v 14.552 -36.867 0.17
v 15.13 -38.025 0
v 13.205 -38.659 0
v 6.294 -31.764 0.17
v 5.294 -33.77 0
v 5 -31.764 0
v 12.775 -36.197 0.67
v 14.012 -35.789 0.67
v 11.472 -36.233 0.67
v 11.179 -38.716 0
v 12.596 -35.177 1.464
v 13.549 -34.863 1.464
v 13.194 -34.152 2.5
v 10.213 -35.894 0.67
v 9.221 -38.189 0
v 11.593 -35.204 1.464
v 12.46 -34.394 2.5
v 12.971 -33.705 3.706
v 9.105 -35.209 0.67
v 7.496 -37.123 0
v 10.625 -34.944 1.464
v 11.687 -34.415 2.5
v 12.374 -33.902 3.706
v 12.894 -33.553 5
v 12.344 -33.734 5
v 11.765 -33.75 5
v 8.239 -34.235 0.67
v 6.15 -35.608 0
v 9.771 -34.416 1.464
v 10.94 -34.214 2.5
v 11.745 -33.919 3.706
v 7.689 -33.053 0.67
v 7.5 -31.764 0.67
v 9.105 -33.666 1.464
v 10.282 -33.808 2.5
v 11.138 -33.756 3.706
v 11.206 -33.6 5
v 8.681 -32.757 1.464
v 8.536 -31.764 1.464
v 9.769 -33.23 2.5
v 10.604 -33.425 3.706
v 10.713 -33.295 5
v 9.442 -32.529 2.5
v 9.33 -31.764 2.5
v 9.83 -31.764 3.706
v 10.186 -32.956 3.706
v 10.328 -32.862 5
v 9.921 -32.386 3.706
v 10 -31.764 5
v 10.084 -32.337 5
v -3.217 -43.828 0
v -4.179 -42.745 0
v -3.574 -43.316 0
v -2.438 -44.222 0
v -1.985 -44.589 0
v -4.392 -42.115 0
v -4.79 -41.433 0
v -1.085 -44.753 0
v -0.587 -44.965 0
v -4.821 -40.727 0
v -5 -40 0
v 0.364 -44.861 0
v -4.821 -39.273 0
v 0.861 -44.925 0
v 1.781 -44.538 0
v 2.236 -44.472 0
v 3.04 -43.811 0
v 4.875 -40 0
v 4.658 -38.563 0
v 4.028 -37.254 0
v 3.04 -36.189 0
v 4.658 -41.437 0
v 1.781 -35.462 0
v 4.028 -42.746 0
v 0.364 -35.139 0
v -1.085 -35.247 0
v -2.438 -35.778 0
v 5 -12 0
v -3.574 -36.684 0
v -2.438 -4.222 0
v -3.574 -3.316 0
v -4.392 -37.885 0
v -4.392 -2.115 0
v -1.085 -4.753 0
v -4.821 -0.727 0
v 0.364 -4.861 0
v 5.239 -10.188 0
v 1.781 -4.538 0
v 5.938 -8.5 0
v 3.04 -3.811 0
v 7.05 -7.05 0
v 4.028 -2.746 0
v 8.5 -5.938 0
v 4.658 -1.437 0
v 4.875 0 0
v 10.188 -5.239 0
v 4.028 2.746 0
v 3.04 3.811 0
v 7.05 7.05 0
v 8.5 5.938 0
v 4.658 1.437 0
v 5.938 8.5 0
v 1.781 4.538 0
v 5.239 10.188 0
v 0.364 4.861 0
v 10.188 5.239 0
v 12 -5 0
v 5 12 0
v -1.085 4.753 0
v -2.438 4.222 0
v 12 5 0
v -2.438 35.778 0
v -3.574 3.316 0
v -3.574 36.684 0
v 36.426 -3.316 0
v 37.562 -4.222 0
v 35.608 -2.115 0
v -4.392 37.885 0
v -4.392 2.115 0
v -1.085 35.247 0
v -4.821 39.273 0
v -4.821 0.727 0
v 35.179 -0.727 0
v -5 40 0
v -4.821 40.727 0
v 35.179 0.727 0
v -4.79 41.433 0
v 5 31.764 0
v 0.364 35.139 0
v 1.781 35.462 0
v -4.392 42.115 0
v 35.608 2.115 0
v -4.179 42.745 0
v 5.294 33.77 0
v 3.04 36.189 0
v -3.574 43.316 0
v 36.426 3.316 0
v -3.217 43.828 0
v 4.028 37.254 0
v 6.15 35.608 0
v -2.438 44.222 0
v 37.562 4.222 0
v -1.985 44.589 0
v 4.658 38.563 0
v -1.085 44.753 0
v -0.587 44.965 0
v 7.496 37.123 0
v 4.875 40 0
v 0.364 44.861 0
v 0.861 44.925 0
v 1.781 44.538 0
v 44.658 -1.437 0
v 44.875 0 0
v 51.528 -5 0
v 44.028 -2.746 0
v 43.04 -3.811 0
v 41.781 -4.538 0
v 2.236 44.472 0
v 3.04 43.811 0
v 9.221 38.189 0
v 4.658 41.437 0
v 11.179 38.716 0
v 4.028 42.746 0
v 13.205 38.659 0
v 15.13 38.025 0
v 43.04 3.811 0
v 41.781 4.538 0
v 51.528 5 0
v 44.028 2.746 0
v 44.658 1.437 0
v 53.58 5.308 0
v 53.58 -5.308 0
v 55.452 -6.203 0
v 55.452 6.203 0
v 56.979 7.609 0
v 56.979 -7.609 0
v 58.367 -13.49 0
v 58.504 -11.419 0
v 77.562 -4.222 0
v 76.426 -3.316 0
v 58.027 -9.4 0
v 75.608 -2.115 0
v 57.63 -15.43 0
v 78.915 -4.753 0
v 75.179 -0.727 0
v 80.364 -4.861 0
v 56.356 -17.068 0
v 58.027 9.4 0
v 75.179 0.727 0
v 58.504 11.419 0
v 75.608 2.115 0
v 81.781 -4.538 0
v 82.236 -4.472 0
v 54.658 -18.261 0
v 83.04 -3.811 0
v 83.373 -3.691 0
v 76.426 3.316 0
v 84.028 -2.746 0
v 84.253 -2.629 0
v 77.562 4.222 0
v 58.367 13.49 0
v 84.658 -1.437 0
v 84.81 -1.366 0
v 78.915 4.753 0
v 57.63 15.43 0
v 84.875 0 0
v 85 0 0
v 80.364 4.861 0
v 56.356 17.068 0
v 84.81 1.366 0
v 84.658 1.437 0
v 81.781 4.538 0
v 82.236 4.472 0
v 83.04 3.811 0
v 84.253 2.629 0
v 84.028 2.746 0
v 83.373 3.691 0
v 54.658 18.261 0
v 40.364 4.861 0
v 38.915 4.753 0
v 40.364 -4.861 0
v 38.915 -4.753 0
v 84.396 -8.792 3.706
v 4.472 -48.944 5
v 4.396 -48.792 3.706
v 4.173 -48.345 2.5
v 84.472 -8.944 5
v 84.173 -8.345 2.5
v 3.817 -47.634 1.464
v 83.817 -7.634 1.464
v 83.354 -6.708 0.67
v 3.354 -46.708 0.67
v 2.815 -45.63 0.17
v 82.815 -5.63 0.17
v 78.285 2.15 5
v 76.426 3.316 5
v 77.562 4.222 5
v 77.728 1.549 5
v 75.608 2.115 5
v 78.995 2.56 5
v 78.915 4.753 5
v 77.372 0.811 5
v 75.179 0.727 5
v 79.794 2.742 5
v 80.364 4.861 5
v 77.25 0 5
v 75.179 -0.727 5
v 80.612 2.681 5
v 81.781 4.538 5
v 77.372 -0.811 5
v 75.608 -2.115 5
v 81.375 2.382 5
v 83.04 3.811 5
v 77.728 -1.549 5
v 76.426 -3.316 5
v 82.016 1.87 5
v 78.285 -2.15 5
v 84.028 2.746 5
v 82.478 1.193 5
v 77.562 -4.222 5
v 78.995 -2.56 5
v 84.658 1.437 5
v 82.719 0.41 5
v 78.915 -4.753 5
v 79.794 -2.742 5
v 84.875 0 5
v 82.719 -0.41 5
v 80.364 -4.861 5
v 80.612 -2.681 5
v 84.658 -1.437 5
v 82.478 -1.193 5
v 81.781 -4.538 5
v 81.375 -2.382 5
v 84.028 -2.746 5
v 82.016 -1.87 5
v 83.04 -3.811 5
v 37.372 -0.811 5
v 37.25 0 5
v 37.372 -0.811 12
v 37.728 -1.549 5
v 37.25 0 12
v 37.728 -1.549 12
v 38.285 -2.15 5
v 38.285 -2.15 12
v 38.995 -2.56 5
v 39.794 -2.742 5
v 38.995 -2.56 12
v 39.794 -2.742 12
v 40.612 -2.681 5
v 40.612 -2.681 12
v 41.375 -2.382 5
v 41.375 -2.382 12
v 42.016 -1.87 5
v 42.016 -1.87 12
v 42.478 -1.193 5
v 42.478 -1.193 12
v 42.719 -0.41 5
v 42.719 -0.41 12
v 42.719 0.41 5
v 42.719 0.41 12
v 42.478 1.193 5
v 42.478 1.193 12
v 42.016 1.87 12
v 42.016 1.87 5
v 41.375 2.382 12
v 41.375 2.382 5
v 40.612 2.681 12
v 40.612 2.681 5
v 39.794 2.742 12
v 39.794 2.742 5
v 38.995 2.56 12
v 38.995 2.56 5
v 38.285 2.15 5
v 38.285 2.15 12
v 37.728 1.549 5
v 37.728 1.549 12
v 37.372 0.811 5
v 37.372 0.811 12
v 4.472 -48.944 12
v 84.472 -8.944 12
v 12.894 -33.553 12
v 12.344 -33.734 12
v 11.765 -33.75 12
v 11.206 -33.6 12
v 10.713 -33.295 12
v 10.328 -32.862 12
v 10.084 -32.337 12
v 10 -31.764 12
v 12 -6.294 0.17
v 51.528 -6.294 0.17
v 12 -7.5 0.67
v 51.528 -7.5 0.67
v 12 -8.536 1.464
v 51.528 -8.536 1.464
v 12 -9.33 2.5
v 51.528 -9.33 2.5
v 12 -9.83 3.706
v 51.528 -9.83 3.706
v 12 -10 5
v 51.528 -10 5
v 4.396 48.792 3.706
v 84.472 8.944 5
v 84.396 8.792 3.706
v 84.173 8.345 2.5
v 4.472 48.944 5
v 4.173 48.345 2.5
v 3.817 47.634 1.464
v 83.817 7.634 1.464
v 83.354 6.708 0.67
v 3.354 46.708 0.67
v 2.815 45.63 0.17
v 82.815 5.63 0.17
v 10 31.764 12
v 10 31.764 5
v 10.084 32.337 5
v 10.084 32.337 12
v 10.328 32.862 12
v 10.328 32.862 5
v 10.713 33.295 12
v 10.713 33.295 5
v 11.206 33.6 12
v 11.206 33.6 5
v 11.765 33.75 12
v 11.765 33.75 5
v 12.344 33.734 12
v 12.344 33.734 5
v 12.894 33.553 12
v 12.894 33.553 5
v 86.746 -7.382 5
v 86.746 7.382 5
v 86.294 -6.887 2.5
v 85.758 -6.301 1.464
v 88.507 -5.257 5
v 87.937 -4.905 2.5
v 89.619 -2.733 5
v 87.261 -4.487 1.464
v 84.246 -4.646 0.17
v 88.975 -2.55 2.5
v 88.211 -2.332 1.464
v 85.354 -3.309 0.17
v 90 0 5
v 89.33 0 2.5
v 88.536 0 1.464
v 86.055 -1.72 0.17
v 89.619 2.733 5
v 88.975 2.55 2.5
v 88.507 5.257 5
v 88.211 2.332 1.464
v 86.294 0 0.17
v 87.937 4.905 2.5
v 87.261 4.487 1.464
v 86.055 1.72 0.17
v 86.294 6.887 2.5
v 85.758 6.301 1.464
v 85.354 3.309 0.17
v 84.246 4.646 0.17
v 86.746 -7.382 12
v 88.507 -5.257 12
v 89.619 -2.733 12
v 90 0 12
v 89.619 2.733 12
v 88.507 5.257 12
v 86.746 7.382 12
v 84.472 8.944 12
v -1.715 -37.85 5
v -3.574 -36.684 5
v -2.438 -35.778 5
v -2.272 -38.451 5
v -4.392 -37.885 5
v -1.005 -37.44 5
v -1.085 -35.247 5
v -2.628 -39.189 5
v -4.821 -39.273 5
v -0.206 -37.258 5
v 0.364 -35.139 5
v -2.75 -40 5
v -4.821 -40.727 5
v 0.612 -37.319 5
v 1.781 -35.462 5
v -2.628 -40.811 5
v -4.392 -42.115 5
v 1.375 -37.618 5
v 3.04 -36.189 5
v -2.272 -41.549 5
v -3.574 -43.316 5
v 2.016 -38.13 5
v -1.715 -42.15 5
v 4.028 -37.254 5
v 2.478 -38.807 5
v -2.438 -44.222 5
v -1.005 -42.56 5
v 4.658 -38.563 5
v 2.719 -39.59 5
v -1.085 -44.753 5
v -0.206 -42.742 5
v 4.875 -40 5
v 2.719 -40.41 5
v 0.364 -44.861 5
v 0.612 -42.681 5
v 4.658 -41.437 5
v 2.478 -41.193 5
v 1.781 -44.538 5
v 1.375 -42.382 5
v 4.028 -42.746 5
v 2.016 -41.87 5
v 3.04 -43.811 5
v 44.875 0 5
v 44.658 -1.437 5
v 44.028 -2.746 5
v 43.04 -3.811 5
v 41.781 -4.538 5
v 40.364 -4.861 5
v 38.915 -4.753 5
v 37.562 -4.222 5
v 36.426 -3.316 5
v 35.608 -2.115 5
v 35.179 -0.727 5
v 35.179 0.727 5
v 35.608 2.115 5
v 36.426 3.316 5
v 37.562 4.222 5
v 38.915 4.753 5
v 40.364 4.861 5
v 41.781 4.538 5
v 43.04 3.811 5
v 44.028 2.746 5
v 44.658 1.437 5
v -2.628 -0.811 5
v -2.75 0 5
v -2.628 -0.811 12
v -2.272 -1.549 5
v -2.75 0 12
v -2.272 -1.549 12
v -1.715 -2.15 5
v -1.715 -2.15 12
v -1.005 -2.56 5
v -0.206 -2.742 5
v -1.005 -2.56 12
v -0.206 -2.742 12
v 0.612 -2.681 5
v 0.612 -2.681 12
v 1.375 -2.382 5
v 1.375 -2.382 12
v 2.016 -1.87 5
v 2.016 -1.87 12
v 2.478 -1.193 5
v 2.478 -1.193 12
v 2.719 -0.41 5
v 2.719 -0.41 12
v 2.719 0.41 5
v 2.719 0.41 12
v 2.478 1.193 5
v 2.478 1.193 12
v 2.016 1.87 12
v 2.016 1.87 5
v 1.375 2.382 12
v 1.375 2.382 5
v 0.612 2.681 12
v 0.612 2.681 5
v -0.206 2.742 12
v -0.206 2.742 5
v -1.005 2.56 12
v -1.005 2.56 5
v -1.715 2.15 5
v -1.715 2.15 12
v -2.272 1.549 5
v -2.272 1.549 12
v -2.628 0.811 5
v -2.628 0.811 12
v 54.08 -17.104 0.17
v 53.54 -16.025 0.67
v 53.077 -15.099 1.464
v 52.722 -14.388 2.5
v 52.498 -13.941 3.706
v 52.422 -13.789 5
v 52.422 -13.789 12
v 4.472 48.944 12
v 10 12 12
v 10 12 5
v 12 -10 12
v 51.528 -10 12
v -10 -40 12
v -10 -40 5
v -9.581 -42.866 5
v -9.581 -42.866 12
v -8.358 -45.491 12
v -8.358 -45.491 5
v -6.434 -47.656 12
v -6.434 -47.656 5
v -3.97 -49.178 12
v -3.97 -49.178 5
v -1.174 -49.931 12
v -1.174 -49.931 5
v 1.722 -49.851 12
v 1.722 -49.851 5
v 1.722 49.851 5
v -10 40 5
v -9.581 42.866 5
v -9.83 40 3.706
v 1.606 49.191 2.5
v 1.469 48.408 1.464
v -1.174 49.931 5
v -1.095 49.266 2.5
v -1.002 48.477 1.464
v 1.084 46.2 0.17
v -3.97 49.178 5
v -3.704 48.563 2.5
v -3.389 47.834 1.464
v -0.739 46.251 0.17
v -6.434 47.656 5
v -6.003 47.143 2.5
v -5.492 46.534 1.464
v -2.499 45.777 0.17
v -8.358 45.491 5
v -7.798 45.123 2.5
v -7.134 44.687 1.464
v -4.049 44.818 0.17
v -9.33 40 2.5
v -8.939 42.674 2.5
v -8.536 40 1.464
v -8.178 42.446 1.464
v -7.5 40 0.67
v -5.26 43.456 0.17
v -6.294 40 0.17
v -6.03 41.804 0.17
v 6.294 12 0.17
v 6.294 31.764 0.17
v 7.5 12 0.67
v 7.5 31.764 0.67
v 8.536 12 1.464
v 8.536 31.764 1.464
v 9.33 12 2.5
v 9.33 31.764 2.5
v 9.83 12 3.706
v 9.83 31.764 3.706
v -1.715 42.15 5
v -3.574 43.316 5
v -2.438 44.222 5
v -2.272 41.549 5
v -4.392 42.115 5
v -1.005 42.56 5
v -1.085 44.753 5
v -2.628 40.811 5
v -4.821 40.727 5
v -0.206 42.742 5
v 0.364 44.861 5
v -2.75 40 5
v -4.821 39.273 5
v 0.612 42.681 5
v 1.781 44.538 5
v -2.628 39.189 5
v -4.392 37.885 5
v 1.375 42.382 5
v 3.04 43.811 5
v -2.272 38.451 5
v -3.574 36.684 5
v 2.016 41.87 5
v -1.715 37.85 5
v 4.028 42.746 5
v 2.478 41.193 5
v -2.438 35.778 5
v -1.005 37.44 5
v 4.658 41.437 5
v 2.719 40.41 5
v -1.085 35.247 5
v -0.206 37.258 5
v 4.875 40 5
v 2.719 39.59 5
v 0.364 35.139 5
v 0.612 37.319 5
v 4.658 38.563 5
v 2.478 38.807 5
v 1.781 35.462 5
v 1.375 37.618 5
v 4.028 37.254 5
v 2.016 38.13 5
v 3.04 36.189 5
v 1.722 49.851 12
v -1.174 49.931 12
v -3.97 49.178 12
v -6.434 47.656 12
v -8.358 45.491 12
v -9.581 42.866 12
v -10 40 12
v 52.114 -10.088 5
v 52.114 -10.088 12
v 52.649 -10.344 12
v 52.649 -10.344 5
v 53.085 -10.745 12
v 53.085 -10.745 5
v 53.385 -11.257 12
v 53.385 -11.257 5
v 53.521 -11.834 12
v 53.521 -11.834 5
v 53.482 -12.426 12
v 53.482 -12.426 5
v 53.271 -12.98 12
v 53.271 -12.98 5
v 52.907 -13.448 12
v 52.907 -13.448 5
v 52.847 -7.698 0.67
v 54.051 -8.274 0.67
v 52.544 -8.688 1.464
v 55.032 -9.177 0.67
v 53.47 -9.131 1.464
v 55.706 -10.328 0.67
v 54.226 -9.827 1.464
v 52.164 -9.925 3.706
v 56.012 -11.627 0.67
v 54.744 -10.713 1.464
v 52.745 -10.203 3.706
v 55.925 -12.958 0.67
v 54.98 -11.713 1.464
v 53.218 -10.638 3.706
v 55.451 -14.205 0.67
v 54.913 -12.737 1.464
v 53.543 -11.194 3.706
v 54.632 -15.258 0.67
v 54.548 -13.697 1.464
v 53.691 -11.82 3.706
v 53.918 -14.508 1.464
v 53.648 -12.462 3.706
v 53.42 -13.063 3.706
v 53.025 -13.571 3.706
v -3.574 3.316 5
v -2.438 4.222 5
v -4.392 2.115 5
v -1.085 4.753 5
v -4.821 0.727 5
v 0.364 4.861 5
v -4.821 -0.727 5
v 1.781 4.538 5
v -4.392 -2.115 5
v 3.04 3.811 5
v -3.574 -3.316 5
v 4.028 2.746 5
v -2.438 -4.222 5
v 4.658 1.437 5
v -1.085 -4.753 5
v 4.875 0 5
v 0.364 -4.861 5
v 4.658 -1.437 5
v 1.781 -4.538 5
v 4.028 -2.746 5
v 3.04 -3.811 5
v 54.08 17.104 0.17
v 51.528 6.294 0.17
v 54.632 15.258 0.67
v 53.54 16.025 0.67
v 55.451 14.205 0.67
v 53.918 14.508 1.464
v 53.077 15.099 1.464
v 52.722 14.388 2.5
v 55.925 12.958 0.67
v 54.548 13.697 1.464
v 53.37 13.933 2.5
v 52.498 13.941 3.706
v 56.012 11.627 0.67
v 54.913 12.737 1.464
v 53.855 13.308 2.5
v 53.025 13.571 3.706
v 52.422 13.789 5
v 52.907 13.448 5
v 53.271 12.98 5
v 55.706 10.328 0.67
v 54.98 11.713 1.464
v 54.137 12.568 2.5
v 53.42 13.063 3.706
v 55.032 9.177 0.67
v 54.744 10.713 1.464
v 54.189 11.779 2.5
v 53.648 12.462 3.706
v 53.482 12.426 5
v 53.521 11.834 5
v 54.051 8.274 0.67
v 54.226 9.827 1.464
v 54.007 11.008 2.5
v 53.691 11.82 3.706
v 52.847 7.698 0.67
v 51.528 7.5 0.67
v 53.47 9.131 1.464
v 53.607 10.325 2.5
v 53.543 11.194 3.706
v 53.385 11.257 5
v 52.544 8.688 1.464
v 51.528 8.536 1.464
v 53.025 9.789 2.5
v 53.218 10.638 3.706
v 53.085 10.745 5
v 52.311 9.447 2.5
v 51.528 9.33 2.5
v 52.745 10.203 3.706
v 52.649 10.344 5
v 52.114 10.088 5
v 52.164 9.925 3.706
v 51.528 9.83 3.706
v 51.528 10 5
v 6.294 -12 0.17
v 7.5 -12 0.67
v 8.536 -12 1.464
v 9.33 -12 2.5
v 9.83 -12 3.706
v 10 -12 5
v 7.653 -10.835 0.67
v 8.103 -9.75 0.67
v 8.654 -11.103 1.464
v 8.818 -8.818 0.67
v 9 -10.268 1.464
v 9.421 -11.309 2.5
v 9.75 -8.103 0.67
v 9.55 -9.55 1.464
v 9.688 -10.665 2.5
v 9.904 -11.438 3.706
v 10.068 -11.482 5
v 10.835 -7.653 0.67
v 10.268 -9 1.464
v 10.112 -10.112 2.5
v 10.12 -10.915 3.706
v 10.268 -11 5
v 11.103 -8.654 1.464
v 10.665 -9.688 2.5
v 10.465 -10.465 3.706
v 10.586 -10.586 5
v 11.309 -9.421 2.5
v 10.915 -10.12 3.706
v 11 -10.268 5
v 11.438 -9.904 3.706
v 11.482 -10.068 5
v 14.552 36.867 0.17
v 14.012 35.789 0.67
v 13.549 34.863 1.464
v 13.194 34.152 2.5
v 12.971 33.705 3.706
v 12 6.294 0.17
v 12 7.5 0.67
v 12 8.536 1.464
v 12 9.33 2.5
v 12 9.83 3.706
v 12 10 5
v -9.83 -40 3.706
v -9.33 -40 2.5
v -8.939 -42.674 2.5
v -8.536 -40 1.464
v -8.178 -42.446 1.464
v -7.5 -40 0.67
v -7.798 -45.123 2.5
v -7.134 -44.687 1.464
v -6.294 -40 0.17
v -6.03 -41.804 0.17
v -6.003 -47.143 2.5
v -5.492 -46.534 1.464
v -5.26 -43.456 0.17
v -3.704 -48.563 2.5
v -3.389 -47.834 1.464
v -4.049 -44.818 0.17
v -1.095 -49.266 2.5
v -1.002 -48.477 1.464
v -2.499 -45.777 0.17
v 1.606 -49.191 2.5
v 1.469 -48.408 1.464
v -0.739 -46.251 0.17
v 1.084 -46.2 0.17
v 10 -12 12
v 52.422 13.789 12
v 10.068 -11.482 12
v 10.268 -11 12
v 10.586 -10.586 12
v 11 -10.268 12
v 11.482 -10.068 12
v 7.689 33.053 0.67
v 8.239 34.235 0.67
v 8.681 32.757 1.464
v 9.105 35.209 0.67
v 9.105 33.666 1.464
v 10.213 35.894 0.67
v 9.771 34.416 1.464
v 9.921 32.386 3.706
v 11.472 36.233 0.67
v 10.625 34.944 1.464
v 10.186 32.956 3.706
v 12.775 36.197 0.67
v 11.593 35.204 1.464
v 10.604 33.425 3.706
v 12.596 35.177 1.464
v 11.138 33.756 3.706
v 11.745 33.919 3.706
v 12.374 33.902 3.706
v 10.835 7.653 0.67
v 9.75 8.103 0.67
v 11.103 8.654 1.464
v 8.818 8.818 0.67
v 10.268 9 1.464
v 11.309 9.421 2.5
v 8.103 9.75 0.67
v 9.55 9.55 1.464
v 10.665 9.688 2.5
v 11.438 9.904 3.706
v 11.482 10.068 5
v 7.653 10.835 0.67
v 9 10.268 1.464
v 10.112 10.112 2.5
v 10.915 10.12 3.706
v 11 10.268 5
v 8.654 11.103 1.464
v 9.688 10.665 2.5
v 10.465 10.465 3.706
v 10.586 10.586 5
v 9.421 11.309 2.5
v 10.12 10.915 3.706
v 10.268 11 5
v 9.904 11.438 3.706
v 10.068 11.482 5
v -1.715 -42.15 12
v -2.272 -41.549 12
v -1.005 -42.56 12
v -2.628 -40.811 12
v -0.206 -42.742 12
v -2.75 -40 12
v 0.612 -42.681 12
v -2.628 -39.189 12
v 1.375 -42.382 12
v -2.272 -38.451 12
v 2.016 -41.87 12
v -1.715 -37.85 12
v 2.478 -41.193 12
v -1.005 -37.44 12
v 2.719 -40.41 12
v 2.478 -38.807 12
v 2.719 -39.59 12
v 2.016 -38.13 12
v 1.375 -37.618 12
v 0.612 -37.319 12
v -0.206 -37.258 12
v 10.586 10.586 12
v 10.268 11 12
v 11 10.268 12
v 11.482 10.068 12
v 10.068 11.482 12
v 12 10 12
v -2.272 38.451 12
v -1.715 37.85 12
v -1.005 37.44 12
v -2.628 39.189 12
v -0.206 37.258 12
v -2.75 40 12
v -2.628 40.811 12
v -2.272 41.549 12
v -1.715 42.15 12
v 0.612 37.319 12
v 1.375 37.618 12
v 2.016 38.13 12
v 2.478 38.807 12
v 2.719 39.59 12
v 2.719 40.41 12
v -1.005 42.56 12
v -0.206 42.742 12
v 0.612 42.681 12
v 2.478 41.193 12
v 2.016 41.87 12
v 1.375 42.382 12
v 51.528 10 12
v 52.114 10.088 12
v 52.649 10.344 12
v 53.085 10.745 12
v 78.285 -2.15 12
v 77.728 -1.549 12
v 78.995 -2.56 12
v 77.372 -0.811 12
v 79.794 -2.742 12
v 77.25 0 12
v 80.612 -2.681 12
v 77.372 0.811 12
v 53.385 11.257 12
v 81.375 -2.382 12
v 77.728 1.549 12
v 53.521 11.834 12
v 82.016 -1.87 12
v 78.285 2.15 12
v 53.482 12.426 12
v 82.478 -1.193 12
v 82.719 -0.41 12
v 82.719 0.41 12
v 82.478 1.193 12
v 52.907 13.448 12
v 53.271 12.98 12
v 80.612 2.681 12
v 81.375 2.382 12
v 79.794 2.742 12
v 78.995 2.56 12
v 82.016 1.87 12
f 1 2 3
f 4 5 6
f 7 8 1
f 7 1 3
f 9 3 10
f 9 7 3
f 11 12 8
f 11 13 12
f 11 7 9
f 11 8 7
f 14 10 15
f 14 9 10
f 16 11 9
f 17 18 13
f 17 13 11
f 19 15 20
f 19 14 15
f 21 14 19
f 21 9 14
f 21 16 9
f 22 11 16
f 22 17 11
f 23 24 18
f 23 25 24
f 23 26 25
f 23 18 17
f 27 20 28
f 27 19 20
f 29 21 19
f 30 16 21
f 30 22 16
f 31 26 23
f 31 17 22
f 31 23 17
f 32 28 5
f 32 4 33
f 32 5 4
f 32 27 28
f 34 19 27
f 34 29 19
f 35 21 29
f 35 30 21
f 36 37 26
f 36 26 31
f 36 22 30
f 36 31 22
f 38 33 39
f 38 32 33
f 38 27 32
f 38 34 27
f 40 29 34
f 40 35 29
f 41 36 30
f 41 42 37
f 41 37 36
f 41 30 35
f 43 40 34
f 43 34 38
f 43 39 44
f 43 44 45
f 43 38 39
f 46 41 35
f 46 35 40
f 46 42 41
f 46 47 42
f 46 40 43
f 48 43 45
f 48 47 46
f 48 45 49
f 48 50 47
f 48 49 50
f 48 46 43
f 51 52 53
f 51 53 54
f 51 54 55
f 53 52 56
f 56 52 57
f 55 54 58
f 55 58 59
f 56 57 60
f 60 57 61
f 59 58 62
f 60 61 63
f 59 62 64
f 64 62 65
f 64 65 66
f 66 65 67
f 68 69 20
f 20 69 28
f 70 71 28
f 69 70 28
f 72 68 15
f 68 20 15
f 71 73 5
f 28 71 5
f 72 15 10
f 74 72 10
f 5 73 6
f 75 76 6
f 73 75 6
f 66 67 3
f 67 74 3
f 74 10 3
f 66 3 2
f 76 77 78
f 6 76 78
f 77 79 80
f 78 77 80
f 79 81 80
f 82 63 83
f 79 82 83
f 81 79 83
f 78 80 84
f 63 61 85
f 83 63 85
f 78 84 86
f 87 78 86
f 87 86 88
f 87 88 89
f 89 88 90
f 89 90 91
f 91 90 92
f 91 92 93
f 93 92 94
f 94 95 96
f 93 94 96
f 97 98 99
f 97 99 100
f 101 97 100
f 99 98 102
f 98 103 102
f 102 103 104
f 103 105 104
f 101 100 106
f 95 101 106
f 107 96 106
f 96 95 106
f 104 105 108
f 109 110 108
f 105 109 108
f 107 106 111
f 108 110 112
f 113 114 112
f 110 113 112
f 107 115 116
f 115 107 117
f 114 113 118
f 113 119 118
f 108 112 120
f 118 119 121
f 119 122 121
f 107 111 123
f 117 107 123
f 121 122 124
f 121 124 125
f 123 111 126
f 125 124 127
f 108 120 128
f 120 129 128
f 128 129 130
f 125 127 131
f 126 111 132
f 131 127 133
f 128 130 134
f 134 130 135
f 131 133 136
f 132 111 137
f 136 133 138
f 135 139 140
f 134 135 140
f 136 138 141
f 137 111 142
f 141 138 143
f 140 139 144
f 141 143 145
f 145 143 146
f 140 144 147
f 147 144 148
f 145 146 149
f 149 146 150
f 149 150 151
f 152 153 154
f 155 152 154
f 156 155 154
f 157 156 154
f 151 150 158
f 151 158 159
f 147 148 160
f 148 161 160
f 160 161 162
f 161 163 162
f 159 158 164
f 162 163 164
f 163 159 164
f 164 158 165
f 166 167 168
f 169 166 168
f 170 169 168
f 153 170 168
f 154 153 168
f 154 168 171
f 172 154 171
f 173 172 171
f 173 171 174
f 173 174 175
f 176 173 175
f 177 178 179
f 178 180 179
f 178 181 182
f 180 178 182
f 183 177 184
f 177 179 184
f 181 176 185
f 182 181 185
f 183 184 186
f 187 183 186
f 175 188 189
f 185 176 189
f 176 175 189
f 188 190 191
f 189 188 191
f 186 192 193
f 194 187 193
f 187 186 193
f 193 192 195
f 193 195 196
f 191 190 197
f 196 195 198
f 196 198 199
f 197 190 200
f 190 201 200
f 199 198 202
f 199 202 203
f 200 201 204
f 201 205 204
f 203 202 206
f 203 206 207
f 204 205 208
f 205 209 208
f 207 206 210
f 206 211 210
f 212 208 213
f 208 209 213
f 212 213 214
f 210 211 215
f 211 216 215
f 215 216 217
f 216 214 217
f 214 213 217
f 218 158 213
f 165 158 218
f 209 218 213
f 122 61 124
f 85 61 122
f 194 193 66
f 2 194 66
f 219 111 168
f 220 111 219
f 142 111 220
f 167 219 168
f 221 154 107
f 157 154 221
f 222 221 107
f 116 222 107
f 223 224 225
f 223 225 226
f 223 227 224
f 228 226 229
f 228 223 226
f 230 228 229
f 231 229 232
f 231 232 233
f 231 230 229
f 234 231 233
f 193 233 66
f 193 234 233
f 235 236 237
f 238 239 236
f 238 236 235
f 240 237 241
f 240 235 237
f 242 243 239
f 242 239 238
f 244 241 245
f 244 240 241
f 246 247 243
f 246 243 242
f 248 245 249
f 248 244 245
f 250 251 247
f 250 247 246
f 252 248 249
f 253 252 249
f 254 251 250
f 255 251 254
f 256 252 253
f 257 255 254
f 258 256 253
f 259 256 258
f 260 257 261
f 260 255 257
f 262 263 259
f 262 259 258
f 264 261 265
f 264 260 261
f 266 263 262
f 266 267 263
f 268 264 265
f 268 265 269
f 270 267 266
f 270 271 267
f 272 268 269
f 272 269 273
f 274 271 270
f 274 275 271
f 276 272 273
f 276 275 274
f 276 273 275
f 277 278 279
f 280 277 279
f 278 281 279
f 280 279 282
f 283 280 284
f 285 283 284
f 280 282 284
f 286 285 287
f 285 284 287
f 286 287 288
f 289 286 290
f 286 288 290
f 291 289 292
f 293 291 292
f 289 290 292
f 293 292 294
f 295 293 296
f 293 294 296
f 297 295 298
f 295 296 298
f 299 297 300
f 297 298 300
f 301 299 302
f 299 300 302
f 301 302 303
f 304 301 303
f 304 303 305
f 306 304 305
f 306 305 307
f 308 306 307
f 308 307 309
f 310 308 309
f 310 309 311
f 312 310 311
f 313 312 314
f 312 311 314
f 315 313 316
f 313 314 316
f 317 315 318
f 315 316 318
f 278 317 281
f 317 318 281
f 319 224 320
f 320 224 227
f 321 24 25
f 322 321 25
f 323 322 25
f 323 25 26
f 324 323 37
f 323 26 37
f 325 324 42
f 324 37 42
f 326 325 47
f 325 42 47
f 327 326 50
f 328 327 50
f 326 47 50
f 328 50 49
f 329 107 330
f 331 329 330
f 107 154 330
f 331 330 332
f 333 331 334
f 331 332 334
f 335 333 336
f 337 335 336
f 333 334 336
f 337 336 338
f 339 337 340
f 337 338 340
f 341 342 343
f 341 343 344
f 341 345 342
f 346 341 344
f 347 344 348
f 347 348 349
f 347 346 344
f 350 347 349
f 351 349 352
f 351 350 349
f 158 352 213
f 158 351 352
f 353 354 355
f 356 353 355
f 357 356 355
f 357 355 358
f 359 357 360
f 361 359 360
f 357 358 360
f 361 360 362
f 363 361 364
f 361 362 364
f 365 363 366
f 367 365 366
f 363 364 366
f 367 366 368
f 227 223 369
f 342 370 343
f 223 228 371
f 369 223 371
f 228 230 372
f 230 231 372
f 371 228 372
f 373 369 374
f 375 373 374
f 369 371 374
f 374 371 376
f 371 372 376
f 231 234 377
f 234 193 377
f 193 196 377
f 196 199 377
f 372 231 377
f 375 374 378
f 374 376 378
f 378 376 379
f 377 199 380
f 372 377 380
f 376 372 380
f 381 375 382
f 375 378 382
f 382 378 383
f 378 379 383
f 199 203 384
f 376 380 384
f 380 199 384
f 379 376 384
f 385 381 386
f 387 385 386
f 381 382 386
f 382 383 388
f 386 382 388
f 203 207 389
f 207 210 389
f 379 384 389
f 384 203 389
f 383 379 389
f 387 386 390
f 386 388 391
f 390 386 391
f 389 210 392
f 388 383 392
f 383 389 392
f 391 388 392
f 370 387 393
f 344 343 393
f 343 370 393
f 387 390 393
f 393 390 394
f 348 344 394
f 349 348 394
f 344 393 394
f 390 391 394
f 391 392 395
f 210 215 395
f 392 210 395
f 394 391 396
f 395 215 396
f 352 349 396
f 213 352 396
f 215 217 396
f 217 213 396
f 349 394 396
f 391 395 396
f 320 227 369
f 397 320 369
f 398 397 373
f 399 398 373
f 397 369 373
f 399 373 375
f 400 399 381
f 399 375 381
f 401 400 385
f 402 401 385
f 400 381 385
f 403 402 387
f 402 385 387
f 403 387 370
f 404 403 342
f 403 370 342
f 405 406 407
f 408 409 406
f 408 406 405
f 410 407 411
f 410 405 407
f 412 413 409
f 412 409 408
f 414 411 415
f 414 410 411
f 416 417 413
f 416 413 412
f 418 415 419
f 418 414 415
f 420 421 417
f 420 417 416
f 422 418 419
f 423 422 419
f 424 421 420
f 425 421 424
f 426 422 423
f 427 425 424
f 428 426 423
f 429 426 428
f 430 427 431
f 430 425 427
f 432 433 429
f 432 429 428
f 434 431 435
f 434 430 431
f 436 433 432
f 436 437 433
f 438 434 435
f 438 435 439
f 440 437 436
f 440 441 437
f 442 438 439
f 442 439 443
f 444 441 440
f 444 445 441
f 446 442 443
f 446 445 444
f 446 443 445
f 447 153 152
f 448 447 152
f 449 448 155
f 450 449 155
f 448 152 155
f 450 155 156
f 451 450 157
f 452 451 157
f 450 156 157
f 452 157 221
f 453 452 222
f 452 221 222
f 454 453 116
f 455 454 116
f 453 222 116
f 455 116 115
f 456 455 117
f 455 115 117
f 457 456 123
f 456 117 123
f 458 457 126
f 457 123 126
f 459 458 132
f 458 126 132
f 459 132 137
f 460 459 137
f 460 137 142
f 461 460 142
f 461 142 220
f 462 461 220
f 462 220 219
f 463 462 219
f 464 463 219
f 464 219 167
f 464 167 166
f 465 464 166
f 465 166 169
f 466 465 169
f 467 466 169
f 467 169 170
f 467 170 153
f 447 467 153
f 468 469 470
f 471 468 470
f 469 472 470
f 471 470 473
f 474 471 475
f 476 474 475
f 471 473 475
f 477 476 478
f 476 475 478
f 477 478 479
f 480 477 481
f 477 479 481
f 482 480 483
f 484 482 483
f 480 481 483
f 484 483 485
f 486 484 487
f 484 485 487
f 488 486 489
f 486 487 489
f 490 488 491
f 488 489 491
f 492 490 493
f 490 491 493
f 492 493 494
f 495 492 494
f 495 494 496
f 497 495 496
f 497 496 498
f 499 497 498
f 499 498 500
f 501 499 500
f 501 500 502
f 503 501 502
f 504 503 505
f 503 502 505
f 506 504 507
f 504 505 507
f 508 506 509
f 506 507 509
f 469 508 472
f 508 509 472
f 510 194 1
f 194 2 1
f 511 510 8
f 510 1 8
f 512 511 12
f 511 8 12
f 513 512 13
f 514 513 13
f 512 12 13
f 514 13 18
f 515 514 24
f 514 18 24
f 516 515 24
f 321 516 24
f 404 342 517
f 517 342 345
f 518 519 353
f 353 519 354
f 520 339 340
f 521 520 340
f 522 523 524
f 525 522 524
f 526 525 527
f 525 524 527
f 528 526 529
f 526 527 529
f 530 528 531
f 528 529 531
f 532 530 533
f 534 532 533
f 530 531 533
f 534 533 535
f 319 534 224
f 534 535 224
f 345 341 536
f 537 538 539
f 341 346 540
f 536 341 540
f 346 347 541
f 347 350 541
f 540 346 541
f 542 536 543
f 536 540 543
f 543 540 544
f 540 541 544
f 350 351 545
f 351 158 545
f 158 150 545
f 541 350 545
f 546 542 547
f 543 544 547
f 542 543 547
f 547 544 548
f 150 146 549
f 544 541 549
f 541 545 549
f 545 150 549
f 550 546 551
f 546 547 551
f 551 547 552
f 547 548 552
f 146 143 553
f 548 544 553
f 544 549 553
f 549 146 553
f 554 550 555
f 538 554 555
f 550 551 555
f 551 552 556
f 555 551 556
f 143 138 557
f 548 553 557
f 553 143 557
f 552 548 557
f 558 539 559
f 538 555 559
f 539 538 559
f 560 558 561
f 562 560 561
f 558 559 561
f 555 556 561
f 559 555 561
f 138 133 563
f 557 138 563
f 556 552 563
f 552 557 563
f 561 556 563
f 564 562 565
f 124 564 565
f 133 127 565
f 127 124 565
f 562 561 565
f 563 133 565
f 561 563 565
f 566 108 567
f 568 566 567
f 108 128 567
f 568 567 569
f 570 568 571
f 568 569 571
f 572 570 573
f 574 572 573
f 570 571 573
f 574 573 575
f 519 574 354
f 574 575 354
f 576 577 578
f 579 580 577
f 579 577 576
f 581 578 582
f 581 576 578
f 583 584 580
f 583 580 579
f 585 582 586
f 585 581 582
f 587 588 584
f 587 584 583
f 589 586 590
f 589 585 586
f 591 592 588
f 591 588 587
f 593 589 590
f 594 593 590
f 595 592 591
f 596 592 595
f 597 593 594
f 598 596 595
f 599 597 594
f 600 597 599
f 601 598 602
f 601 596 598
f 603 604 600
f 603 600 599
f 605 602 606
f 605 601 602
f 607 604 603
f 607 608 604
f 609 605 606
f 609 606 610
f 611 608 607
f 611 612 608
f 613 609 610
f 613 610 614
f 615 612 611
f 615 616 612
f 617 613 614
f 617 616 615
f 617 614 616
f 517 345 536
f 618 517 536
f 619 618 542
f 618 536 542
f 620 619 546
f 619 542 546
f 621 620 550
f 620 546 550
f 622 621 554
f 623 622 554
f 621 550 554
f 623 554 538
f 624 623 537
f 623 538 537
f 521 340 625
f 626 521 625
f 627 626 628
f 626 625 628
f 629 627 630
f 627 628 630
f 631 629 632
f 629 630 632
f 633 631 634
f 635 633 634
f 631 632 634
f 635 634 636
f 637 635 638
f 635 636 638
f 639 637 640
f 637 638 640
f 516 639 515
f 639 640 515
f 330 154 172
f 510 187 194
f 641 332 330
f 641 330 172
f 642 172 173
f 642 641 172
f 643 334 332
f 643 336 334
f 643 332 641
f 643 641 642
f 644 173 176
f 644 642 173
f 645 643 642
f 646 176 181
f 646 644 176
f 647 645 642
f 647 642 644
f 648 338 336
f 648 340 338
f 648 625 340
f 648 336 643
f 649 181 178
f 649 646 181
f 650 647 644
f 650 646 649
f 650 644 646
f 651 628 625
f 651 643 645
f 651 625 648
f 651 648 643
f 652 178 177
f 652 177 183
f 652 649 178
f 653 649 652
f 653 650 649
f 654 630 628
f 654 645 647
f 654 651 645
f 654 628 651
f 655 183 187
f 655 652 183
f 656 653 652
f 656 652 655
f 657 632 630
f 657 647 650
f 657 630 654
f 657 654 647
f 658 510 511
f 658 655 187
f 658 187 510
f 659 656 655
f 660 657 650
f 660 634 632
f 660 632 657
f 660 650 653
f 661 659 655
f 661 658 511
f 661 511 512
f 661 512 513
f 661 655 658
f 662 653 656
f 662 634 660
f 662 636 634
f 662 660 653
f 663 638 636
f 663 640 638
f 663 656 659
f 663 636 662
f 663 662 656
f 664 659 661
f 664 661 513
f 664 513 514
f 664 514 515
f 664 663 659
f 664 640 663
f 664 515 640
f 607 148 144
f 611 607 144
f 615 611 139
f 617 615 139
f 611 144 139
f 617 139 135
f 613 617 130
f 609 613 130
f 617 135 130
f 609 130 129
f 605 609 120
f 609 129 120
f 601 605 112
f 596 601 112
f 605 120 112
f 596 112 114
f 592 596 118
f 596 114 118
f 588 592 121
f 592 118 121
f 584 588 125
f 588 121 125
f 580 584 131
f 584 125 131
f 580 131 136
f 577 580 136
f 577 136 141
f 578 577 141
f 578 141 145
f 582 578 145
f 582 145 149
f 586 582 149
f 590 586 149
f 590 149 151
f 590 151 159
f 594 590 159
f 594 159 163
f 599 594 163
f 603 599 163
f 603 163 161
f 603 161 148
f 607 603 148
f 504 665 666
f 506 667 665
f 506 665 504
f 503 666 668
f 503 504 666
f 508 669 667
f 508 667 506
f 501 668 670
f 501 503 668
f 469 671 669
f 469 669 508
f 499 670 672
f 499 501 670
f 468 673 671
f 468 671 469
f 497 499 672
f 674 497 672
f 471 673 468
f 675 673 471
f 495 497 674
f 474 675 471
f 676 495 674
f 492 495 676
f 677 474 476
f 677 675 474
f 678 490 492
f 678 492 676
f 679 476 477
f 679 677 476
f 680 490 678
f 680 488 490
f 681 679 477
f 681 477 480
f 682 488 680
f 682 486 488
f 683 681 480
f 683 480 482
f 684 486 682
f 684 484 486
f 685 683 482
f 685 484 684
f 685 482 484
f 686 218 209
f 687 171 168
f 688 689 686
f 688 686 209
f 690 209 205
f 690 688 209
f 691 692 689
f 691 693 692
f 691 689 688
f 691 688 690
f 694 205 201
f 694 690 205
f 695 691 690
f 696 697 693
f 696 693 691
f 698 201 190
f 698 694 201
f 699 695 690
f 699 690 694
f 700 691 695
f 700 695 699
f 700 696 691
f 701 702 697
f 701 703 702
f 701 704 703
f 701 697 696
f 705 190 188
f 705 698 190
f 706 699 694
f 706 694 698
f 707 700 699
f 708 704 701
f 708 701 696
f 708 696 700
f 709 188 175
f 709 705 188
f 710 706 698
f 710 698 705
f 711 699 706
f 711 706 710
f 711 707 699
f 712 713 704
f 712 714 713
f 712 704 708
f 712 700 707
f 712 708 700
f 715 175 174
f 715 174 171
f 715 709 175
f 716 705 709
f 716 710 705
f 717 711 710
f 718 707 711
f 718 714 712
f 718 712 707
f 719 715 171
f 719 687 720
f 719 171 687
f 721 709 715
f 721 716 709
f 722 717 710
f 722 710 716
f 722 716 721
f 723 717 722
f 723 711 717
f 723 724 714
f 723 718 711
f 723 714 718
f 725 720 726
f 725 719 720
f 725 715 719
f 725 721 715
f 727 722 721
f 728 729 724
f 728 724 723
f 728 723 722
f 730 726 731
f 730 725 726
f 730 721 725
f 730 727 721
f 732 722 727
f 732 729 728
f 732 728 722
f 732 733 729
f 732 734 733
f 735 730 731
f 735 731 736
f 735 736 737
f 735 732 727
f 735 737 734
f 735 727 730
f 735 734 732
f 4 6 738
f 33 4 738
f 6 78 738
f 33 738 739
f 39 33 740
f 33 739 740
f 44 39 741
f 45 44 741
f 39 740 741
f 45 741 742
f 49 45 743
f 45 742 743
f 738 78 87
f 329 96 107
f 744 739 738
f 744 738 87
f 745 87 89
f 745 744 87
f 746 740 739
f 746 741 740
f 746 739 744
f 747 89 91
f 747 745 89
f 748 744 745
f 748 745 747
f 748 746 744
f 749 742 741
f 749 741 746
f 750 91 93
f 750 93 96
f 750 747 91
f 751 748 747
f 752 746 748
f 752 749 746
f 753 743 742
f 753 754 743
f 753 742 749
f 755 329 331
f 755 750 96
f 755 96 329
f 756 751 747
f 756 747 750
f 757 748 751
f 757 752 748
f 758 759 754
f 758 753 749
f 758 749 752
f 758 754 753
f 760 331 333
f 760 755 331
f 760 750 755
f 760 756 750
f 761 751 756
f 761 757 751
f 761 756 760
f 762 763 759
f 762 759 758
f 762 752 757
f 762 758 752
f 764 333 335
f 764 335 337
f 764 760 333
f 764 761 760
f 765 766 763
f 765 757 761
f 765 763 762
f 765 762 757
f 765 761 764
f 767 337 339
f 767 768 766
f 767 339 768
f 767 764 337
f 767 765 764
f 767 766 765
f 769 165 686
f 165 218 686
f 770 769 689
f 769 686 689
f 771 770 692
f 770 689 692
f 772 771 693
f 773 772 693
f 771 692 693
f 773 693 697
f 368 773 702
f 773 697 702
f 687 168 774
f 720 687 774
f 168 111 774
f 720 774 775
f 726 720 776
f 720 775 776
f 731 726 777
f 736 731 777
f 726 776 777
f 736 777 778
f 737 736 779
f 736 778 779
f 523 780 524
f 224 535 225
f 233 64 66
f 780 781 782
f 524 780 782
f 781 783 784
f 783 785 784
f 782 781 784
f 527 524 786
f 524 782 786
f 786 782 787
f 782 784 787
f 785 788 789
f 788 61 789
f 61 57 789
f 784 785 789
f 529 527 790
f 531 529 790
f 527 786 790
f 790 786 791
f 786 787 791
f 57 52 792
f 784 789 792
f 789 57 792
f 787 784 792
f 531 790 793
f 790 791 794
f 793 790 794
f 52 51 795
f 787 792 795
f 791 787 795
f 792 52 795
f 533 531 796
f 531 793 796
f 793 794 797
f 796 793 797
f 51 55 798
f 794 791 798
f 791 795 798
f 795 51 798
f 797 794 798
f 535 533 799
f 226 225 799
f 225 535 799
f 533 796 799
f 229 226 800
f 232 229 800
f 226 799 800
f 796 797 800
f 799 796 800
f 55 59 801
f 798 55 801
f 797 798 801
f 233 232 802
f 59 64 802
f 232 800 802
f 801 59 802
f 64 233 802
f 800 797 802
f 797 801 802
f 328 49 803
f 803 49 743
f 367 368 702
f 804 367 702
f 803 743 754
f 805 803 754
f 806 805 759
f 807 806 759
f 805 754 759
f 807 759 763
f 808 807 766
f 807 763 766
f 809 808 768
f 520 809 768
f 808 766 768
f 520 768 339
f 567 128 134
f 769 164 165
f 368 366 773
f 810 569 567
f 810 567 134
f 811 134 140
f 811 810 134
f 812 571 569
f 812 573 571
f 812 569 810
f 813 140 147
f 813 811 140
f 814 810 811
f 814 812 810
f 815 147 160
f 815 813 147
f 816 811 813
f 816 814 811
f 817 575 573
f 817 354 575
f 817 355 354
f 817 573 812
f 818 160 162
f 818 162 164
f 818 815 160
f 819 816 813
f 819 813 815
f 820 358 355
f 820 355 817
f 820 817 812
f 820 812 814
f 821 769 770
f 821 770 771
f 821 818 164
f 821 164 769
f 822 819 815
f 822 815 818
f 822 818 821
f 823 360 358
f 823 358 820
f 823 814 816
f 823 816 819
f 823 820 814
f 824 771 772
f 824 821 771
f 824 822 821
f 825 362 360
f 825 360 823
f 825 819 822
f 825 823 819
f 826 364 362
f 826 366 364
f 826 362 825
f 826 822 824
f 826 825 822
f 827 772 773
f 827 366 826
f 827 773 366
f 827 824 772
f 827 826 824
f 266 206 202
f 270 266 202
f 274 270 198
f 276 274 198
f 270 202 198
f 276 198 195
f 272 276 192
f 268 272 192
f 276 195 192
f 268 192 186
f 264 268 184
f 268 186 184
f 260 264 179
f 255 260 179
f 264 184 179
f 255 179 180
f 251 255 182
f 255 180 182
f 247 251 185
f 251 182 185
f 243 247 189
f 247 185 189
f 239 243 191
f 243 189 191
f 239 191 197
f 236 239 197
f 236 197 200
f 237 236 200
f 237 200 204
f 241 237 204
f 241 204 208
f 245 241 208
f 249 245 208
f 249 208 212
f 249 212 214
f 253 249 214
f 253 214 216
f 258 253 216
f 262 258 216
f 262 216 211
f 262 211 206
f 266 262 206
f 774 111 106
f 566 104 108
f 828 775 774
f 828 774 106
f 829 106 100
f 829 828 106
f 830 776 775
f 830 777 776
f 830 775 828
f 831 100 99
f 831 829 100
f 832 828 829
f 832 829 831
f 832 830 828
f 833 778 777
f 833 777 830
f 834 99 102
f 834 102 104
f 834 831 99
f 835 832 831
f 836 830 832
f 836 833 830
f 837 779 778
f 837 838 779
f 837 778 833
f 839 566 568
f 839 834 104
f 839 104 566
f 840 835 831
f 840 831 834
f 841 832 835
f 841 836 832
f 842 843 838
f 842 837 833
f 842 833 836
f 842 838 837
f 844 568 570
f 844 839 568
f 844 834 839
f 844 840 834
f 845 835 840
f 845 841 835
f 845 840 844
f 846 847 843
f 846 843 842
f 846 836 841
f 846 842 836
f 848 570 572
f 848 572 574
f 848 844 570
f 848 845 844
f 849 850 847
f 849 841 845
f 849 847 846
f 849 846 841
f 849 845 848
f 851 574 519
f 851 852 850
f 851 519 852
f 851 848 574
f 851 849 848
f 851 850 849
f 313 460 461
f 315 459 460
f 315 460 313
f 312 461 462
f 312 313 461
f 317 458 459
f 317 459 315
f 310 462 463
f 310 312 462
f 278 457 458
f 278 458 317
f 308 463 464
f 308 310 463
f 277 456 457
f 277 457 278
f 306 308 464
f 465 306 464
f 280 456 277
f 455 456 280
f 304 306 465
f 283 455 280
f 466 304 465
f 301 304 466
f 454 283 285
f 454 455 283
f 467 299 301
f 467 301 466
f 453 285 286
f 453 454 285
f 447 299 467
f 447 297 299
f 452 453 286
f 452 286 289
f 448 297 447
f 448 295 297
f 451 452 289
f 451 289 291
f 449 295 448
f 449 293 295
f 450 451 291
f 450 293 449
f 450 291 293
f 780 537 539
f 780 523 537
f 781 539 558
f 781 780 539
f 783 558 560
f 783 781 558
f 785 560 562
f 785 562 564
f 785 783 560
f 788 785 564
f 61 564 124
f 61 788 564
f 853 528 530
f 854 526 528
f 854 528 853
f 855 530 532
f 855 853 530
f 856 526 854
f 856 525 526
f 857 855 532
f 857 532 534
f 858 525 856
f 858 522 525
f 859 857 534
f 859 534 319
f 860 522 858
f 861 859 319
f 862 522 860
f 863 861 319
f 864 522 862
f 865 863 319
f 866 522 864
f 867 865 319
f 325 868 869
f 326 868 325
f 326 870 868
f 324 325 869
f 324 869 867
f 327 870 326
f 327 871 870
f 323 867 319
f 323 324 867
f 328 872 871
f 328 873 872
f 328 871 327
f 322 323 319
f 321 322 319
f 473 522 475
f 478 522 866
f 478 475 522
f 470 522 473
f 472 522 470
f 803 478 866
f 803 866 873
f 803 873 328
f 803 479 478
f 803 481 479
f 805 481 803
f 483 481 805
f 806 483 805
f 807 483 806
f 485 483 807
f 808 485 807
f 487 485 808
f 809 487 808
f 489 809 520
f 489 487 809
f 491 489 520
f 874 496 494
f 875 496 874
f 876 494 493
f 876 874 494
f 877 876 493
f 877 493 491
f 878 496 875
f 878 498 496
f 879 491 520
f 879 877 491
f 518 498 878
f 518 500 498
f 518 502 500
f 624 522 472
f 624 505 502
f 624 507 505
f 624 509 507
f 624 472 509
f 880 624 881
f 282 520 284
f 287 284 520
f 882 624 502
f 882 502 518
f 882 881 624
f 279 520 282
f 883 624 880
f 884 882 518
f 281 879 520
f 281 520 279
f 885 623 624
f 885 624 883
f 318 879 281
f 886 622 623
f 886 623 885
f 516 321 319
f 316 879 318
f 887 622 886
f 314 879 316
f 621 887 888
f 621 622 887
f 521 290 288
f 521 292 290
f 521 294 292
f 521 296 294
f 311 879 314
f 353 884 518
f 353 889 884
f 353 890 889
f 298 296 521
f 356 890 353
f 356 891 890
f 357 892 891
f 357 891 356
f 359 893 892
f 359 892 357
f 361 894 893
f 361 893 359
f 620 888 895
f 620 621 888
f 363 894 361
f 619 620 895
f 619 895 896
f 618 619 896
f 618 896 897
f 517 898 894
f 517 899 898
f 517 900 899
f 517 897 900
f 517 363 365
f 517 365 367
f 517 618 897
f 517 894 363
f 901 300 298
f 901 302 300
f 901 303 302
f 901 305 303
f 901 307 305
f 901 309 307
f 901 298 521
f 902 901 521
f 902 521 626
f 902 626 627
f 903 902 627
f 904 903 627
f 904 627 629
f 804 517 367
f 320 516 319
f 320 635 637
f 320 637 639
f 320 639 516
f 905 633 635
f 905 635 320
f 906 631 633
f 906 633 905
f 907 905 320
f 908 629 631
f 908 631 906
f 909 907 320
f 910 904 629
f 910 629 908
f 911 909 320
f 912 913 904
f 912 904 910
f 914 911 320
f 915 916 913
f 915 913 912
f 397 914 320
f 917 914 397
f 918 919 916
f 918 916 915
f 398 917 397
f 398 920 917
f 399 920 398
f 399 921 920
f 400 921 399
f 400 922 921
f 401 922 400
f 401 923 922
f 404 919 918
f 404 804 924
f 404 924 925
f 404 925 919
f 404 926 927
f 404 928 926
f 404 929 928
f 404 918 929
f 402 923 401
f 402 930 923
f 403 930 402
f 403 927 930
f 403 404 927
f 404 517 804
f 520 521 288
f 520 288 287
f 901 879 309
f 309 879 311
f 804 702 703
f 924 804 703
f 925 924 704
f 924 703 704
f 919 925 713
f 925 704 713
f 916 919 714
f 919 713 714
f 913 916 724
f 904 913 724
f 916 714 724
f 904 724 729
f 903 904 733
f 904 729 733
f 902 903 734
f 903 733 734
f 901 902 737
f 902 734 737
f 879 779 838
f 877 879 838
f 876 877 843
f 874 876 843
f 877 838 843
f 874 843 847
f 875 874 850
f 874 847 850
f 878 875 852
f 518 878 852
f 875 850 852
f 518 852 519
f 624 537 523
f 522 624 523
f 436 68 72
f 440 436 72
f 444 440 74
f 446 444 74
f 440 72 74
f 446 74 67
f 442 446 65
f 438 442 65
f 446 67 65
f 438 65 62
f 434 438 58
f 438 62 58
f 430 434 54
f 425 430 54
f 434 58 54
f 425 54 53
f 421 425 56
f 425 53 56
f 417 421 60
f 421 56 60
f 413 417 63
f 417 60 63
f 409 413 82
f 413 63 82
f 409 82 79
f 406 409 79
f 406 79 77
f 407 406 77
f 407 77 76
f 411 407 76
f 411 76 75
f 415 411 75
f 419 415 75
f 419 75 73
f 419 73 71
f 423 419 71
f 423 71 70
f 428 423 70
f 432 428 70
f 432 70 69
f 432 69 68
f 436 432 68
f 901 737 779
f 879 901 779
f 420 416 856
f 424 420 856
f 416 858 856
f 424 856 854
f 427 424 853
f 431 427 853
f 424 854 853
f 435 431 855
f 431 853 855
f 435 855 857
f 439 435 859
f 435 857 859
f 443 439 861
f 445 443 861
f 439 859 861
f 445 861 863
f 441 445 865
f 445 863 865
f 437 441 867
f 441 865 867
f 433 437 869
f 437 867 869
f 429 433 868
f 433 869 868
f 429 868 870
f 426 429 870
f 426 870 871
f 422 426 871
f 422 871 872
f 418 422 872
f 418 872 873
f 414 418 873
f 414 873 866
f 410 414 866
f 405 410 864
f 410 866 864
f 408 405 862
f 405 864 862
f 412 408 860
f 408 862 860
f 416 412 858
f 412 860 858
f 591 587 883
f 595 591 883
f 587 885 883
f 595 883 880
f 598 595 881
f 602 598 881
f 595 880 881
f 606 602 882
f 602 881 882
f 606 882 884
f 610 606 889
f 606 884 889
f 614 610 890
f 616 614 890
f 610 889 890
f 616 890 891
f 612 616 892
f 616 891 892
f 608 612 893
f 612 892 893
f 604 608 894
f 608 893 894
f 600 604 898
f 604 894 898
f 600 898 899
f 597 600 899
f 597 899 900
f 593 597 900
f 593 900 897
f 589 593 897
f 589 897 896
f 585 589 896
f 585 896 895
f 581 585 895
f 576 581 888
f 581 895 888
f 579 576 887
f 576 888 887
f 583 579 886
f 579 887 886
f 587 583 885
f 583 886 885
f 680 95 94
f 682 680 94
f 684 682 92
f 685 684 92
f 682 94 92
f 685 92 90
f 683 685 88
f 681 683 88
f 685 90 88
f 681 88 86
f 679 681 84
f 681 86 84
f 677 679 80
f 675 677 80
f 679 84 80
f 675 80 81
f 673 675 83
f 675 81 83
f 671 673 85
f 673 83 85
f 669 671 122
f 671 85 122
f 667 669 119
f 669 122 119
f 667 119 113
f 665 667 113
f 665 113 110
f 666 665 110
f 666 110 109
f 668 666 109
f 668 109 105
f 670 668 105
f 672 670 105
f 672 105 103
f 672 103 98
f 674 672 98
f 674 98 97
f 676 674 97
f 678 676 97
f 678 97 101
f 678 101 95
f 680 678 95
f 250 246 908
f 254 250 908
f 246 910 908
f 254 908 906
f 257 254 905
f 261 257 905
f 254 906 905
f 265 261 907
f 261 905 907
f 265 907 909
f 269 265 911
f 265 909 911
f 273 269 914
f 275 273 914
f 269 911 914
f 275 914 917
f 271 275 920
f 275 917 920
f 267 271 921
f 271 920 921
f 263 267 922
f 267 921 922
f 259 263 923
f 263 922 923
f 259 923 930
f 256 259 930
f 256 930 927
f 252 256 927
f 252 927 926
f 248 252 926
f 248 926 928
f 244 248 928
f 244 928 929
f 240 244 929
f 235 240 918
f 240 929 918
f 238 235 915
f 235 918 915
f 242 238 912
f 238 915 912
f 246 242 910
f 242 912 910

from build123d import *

# Parameters (mm, degrees)
F1_DEPTH       = 12
F2_D           = 5.5
F2_CBORE_D     = 9.75
F2_CBORE_DEPTH = 5
F3_R           = 4.99999


# Not quite as in the source:
# - a fillet or chamfer is up to 0.001 mm smaller than in the source, because OpenCascade refuses the exact size


with BuildPart() as f1:
    # F0 (on Top) → F1 (new body)
    with BuildSketch(Plane.XY):
        with BuildLine():
            Line((84.472135955, 8.94427191), (4.472135955, 48.94427191))
            ThreePointArc((4.472135955, 48.94427191), (-5.2573111212, 48.5065080835), (-10, 40))
            Line((-10, 40), (-10, -40))
            ThreePointArc((-10, -40), (-5.2573111212, -48.5065080835), (4.472135955, -48.94427191))
            Line((4.472135955, -48.94427191), (84.472135955, -8.94427191))
            ThreePointArc((84.472135955, -8.94427191), (90, 0), (84.472135955, 8.94427191))
        make_face()
        with BuildLine():
            Line((10, -31.7639320225), (10, -12))
            ThreePointArc((10, -12), (10.5857864376, -10.5857864376), (12, -10))
            Line((12, -10), (51.527864045, -10))
            ThreePointArc((51.527864045, -10), (53.4743620239, -11.5404941589), (52.422291236, -13.788854382))
            Line((52.422291236, -13.788854382), (12.894427191, -33.5527864045))
            ThreePointArc((12.894427191, -33.5527864045), (10.9485377758, -33.4652336392), (10, -31.7639320225))
        make_face(mode=Mode.SUBTRACT)
        with BuildLine():
            ThreePointArc((10, 31.7639320225), (10.9485377758, 33.4652336392), (12.894427191, 33.5527864045))
            Line((12.894427191, 33.5527864045), (52.422291236, 13.788854382))
            ThreePointArc((52.422291236, 13.788854382), (53.4743620239, 11.5404941589), (51.527864045, 10))
            Line((51.527864045, 10), (12, 10))
            ThreePointArc((12, 10), (10.5857864376, 10.5857864376), (10, 12))
            Line((10, 12), (10, 31.7639320225))
        make_face(mode=Mode.SUBTRACT)
    extrude(amount=F1_DEPTH)

    # F2 (through all)
    with Locations(Plane(origin=(0, 0, 0), x_dir=(1, 0, 0), z_dir=(0, 0, -1))):
        with Locations((0, -40), (0, 40), (0, 0), (40, 0), (80, 0)):
            CounterBoreHole(F2_D / 2, F2_CBORE_D / 2, F2_CBORE_DEPTH)

    # F3 (radius 5 in the source; OpenCascade refuses exactly that, so slightly less here)
    f3_edges = [f1.edges().sort_by_distance(p)[0] for p in [
        (44.472136, 28.944272, 0),
        (32.658359, 23.67082, 0),
        (32.658359, -23.67082, 0),
    ]]
    fillet(f3_edges, radius=F3_R)


solid = f1.part
